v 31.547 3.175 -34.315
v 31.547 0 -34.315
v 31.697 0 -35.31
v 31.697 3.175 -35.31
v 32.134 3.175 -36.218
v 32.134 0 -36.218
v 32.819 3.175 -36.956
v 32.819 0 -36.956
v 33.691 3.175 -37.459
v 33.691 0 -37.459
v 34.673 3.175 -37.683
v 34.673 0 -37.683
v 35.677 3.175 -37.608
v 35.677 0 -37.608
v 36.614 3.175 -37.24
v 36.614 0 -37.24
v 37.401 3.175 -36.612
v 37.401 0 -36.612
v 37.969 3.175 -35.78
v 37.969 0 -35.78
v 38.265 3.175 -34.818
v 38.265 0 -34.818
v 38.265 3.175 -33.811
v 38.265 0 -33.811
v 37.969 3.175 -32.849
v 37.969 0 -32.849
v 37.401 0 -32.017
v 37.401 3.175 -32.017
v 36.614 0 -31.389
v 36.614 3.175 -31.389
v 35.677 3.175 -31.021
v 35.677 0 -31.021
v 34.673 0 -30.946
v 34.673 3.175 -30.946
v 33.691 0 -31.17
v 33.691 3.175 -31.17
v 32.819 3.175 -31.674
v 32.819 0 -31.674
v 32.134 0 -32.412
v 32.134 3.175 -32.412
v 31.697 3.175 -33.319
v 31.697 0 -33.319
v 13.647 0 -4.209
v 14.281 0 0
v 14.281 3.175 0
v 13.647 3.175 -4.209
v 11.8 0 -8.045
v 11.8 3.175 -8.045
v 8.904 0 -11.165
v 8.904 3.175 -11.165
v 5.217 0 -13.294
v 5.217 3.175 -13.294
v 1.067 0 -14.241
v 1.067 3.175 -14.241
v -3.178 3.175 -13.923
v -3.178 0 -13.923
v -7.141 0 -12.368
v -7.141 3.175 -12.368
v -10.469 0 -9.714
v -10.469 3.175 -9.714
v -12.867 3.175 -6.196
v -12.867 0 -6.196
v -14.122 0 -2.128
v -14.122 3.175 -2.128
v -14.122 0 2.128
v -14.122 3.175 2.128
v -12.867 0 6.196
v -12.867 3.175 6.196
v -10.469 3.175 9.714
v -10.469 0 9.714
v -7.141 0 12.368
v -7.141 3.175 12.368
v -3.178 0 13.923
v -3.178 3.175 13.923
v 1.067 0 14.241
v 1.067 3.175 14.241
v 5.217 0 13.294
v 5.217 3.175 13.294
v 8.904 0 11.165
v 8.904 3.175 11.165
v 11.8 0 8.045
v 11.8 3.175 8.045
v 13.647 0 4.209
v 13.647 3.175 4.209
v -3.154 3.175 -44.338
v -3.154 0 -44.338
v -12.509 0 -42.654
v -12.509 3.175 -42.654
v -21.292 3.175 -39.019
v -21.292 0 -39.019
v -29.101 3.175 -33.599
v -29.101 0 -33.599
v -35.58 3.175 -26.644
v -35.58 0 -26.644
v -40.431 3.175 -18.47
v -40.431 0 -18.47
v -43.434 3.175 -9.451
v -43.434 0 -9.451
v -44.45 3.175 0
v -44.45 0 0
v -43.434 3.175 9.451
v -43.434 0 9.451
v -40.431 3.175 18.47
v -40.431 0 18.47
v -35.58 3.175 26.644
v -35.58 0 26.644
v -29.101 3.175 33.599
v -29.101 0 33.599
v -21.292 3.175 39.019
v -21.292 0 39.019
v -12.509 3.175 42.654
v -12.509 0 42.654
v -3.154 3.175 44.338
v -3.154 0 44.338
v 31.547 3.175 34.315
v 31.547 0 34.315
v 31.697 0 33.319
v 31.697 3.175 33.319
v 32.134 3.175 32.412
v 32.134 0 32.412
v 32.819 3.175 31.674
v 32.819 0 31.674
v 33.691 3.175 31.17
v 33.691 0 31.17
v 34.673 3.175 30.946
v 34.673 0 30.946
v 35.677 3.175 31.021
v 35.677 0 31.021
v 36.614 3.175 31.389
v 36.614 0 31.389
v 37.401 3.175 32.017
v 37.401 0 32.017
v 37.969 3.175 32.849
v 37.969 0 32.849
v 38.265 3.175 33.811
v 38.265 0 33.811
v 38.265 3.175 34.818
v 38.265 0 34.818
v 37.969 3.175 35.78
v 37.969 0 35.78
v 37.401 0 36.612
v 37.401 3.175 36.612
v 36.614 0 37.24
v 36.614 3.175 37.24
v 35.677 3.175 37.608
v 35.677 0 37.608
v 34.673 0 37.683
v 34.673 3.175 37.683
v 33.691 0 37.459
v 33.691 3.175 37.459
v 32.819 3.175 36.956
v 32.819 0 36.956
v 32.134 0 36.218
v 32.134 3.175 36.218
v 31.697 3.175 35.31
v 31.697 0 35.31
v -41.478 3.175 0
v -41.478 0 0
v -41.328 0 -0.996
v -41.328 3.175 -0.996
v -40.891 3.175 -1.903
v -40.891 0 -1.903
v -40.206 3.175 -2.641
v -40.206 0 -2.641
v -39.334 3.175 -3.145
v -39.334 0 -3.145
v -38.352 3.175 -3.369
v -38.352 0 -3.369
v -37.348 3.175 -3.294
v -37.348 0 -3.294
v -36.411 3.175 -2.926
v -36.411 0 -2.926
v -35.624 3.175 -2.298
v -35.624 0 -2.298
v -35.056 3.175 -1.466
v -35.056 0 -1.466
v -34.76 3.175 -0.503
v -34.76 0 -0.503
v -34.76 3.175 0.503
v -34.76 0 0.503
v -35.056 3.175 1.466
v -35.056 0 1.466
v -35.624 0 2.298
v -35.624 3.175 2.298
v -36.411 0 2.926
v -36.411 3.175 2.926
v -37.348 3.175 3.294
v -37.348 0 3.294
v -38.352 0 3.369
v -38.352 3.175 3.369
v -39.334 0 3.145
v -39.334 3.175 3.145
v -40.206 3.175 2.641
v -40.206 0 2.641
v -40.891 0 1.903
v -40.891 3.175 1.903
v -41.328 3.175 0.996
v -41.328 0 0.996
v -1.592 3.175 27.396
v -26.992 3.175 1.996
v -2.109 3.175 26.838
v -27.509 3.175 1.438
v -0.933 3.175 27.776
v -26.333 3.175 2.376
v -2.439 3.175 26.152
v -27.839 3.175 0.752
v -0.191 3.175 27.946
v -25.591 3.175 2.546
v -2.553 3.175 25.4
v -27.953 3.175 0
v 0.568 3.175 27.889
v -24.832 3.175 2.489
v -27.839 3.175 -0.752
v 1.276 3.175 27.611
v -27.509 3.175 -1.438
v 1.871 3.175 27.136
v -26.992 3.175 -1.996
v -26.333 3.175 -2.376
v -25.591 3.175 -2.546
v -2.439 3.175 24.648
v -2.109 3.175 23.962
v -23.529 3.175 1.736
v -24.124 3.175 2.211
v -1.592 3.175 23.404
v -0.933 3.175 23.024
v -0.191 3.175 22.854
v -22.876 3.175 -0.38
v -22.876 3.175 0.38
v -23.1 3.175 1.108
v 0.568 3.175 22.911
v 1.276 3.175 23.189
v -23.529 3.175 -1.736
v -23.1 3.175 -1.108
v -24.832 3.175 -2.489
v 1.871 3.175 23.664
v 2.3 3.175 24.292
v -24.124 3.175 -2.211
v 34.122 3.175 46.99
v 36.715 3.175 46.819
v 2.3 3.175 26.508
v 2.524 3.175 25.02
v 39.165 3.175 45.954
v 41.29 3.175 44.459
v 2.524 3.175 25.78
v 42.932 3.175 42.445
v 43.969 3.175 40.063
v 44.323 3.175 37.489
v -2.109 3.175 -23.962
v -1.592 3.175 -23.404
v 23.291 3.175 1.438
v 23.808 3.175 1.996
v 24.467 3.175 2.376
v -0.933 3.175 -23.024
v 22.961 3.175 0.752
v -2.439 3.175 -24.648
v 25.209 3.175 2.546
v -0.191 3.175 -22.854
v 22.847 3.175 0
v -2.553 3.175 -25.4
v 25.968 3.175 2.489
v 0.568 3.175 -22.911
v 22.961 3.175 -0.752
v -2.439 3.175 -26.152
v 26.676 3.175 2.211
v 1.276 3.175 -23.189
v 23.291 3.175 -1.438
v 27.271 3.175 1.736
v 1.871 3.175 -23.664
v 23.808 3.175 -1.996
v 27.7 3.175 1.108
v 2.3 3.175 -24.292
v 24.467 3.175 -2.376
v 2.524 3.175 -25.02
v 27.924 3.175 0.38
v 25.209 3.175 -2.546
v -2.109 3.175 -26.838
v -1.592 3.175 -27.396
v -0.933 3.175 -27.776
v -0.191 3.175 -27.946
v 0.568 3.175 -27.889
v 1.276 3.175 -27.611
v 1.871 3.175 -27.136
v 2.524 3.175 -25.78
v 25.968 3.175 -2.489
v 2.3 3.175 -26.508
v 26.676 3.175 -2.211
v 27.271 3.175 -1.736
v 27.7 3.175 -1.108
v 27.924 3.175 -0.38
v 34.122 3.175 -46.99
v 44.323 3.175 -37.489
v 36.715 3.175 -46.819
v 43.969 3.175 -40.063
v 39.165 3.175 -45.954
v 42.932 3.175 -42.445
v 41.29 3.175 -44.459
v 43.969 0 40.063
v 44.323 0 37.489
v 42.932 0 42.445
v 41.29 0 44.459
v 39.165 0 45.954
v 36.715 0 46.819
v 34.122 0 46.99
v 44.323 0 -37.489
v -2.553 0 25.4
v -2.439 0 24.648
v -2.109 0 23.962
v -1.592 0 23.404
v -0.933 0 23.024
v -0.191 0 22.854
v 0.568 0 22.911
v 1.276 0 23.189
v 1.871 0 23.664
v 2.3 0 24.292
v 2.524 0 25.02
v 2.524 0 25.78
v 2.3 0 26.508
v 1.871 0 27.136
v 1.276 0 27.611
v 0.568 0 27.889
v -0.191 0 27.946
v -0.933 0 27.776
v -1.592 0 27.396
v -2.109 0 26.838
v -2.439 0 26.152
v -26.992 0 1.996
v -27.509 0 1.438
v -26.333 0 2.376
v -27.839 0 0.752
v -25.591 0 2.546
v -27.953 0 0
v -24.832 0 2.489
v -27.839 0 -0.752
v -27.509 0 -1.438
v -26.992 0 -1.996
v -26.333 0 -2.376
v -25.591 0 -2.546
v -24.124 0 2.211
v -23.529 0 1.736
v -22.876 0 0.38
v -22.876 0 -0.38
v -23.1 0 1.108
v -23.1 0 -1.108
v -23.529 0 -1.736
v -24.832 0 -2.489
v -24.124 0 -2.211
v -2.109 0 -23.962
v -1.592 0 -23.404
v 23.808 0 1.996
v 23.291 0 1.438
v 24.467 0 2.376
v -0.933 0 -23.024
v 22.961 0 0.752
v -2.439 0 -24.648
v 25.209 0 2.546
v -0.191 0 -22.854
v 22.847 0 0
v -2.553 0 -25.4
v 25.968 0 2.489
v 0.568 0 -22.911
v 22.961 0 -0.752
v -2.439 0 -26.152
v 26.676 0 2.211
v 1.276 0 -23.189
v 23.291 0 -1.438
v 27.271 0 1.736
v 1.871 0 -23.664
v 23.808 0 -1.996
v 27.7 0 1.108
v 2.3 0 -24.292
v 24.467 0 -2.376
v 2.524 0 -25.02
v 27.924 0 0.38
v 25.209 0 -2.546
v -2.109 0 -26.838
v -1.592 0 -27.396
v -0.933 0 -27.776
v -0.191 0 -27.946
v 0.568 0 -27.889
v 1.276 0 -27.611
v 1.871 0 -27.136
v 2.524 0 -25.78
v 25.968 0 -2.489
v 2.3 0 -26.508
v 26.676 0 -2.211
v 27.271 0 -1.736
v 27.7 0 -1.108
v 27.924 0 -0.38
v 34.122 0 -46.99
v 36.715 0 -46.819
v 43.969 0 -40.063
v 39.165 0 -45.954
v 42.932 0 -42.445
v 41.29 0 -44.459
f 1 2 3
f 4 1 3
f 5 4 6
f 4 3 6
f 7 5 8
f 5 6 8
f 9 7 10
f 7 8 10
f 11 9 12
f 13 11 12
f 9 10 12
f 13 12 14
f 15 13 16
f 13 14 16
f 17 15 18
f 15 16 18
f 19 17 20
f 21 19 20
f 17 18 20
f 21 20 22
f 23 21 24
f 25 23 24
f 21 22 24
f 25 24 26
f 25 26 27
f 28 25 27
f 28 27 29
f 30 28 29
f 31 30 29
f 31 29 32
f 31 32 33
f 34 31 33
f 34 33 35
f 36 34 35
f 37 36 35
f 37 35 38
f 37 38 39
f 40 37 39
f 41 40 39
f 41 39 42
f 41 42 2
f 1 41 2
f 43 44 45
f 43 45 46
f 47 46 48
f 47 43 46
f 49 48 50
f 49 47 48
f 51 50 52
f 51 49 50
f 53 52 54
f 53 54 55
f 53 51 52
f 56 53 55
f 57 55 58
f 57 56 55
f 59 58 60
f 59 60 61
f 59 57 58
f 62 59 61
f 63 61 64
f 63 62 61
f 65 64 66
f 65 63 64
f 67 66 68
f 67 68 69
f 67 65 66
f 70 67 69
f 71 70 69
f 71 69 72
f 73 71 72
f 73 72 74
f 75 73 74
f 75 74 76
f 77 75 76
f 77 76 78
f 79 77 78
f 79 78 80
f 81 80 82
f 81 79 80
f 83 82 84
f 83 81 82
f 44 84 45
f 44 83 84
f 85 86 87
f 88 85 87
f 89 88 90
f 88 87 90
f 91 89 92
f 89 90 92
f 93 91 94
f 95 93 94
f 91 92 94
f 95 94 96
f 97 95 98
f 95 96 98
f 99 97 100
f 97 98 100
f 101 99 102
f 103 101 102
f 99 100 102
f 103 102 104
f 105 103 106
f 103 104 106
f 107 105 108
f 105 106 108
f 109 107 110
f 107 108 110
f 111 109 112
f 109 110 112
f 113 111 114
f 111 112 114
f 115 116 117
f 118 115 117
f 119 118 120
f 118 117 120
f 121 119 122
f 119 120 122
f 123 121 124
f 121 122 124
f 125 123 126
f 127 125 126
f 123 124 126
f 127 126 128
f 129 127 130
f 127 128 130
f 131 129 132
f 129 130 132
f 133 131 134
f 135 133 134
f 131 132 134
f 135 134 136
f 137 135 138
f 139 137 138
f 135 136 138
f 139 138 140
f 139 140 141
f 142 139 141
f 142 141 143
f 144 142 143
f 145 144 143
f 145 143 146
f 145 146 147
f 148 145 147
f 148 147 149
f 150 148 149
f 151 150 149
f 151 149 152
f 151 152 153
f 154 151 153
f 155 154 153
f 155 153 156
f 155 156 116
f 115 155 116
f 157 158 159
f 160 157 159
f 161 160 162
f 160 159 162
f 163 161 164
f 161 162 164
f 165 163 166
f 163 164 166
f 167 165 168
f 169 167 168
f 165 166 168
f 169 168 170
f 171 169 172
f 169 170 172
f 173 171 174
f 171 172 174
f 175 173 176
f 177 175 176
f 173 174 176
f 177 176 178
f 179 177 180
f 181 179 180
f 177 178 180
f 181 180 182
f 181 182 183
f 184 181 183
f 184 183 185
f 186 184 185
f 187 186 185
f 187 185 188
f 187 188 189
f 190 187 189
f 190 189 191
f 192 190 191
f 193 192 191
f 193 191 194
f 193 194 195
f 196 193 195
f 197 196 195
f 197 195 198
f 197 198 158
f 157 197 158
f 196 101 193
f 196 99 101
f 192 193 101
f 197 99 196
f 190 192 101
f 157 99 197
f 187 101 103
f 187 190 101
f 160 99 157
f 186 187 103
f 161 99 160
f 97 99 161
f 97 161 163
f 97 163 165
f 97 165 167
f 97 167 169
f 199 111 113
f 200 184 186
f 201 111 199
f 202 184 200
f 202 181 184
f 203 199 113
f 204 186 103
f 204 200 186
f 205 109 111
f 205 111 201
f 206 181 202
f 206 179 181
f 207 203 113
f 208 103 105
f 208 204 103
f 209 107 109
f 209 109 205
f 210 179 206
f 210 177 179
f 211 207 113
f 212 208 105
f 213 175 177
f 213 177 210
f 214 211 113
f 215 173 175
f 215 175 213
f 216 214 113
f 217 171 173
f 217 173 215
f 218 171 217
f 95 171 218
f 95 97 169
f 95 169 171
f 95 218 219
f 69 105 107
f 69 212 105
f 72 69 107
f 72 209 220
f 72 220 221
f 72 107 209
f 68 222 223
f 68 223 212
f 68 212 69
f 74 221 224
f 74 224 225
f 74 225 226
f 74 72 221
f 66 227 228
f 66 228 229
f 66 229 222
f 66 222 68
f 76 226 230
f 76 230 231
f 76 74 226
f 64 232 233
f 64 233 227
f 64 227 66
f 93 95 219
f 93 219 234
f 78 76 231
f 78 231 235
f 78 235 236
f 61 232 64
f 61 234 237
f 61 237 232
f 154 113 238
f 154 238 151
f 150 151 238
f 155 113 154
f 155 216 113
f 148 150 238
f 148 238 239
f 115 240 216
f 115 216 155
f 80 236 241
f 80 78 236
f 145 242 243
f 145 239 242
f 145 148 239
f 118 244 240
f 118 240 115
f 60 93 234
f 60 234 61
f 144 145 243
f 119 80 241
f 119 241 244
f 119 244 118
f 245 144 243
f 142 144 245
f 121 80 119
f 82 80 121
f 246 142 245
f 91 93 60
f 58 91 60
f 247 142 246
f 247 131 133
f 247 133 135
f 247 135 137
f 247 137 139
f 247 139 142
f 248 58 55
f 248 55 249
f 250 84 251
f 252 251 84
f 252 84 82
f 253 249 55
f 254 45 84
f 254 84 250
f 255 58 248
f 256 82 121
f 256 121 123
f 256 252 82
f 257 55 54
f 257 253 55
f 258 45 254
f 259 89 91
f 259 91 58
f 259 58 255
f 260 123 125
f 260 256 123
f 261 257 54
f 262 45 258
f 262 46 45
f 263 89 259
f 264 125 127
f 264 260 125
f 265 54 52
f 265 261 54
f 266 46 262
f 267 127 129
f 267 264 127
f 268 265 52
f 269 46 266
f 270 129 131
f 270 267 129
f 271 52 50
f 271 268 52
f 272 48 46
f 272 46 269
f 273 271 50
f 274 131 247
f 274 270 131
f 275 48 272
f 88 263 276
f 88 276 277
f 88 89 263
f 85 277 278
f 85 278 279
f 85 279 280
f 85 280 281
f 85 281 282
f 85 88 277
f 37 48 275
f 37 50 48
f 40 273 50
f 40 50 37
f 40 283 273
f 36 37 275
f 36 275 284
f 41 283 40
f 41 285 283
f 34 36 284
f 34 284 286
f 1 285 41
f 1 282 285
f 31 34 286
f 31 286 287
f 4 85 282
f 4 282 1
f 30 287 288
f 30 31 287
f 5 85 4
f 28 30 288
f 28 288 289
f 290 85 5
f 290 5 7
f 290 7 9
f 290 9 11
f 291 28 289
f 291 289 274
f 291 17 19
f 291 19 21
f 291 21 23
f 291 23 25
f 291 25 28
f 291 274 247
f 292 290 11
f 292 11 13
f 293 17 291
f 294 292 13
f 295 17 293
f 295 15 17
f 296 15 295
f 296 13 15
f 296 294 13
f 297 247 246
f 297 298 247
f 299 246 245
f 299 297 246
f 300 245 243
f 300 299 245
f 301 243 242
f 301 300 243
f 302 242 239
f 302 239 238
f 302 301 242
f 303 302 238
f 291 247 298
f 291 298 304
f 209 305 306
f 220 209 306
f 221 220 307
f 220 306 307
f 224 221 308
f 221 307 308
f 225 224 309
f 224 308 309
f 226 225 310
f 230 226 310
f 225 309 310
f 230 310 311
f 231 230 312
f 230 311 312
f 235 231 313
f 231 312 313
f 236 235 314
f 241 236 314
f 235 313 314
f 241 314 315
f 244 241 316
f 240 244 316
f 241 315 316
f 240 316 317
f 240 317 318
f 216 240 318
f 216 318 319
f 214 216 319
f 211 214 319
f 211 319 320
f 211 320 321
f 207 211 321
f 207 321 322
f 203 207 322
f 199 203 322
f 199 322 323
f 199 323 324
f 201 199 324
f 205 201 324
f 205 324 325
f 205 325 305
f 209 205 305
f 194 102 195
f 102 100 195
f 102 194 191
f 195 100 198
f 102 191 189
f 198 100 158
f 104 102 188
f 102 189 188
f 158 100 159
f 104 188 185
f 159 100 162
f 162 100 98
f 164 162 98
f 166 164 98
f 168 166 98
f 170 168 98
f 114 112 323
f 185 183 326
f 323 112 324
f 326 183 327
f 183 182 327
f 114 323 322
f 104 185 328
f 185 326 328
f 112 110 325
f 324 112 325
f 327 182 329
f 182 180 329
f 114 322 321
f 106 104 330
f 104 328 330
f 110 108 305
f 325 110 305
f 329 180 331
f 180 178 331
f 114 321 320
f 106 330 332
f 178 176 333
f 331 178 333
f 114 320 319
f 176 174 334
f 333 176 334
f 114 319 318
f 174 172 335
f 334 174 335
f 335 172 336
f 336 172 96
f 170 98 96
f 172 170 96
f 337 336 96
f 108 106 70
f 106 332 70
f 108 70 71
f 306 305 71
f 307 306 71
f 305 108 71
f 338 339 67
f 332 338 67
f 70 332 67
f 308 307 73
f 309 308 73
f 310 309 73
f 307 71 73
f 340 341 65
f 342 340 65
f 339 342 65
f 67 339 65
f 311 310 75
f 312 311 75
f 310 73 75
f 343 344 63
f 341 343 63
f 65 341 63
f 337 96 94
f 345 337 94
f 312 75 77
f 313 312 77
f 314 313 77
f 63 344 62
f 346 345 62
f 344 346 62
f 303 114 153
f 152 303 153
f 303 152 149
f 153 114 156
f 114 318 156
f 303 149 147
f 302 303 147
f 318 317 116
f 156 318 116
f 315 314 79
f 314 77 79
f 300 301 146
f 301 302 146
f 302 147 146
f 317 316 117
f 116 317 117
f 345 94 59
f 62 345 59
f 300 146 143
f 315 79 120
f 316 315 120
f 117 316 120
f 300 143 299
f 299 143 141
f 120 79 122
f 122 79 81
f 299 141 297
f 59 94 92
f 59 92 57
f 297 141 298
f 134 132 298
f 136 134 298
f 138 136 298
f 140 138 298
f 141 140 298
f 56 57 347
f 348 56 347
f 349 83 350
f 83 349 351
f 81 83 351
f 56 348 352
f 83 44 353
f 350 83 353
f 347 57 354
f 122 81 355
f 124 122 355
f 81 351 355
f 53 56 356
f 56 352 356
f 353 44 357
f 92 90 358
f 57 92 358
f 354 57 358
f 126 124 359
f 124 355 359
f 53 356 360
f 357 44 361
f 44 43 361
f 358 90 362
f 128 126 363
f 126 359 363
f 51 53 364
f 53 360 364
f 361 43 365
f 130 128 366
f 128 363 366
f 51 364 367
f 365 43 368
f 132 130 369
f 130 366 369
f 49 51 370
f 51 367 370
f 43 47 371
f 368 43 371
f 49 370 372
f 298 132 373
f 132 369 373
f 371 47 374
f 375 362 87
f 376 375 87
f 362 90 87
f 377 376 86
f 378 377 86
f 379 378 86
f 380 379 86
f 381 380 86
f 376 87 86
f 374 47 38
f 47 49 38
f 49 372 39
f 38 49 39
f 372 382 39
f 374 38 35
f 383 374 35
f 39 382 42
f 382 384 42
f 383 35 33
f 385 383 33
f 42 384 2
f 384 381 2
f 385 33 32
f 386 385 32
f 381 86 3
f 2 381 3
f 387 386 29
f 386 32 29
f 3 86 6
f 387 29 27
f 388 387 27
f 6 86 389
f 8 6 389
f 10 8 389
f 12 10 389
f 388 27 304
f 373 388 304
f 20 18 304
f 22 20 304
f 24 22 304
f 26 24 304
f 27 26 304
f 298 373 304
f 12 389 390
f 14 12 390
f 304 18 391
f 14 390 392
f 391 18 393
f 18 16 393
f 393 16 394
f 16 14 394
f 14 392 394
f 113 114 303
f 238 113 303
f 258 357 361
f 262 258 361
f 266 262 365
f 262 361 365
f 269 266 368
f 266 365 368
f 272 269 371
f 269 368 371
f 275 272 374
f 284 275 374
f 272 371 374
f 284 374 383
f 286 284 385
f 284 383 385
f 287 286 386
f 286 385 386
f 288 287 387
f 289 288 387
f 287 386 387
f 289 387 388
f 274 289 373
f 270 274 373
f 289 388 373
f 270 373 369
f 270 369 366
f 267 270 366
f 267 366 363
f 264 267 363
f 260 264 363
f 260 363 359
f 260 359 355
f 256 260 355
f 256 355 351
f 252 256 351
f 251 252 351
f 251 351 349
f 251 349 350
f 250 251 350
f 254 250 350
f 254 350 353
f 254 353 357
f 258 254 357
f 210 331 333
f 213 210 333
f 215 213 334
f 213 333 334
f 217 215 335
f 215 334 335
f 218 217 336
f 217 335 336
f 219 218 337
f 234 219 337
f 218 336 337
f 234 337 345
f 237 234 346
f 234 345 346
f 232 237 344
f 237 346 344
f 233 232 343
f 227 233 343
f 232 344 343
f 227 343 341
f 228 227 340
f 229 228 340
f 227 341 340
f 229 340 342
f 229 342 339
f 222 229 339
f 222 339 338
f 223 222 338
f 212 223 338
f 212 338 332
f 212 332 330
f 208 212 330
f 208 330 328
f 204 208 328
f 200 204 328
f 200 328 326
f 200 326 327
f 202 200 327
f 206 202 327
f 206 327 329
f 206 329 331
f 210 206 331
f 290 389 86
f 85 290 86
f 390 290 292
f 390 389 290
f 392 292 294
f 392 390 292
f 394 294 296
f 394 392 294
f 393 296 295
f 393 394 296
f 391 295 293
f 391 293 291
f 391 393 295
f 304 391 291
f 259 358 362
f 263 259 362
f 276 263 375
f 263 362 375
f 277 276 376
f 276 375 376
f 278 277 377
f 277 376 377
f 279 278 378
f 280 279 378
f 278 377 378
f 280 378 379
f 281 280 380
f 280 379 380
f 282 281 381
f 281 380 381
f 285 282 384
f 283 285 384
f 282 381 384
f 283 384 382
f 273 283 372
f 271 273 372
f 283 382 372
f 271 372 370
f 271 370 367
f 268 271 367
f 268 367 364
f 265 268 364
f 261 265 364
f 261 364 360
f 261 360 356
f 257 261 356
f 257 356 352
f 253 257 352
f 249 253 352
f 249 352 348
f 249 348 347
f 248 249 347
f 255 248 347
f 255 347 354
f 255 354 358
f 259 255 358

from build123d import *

# Parameters (mm, degrees)
SKETCH1_R               = 14.2875
SKETCH1_R_2             = 14.28115
BOSS_EXTRUDE1_DEPTH     = 3.175
F_10_CLEARANCE_HOLE1_D  = 5.1054
F_1_4_CLEARANCE_HOLE1_D = 6.7564
CUT_EXTRUDE2_DEPTH      = 4.175
FILLET2_R               = 9.525


with BuildPart() as part:
    # Sketch1 → Boss-Extrude1 (new body)
    with BuildSketch(Plane(origin=(0, 0, 0), x_dir=(1, 0, 0), z_dir=(0, 1, 0))):
        with BuildLine():
            Line((85.884602434, 50.671947857), (-3.15409287, 44.337954375))
            ThreePointArc((-3.15409287, 44.337954375), (-44.45, 0), (-3.15409287, -44.337954375))
            Line((-3.15409287, -44.337954375), (85.884602434, -50.671947857))
            ThreePointArc((85.884602434, -50.671947857), (140.28928, 0), (85.884602434, 50.671947857))
        make_face()
        with Locations((89.48928, 0)):
            Circle(SKETCH1_R, mode=Mode.SUBTRACT)
        Circle(SKETCH1_R_2, mode=Mode.SUBTRACT)
    extrude(amount=BOSS_EXTRUDE1_DEPTH)

    # #10 Clearance Hole1 (through all)
    with Locations(Plane(origin=(0, 3.175, 0), x_dir=(1, 0, 0), z_dir=(0, 1, 0))):
        with Locations((0, 25.4), (25.4, 0), (0, -25.4), (-25.4, 0)):
            Hole(F_10_CLEARANCE_HOLE1_D / 2)

    # 1/4 Clearance Hole1 (through all)
    with Locations(Plane(origin=(0, 3.175, 0), x_dir=(1, 0, 0), z_dir=(0, 1, 0))):
        with Locations((54.56428, 34.925), (54.56428, -34.925), (114.88928, 25.4), (114.88928, -25.4), (-38.1, 0), (34.925, 34.314713318), (34.925, -34.314713318)):
            Hole(F_1_4_CLEARANCE_HOLE1_D / 2)

    # Sketch7 → Cut-Extrude2 (cut, through all)
    with BuildSketch(Plane(origin=(0, 3.175, 0), x_dir=(1, 0, 0), z_dir=(0, 1, 0))):
        Polygon((44.323, 47.715357826), (140.28928, 54.542162621), (140.28928, -54.542162621), (44.323, -47.715357826), align=None)
    extrude(amount=-CUT_EXTRUDE2_DEPTH, mode=Mode.SUBTRACT)

    # Fillet2
    fillet2_edges = [part.edges().sort_by_distance(p)[0] for p in [
        (44.323, 1.5875, -47.715357826),
        (44.323, 1.5875, 47.715357826),
    ]]
    fillet(fillet2_edges, radius=FILLET2_R)


solid = part.part
